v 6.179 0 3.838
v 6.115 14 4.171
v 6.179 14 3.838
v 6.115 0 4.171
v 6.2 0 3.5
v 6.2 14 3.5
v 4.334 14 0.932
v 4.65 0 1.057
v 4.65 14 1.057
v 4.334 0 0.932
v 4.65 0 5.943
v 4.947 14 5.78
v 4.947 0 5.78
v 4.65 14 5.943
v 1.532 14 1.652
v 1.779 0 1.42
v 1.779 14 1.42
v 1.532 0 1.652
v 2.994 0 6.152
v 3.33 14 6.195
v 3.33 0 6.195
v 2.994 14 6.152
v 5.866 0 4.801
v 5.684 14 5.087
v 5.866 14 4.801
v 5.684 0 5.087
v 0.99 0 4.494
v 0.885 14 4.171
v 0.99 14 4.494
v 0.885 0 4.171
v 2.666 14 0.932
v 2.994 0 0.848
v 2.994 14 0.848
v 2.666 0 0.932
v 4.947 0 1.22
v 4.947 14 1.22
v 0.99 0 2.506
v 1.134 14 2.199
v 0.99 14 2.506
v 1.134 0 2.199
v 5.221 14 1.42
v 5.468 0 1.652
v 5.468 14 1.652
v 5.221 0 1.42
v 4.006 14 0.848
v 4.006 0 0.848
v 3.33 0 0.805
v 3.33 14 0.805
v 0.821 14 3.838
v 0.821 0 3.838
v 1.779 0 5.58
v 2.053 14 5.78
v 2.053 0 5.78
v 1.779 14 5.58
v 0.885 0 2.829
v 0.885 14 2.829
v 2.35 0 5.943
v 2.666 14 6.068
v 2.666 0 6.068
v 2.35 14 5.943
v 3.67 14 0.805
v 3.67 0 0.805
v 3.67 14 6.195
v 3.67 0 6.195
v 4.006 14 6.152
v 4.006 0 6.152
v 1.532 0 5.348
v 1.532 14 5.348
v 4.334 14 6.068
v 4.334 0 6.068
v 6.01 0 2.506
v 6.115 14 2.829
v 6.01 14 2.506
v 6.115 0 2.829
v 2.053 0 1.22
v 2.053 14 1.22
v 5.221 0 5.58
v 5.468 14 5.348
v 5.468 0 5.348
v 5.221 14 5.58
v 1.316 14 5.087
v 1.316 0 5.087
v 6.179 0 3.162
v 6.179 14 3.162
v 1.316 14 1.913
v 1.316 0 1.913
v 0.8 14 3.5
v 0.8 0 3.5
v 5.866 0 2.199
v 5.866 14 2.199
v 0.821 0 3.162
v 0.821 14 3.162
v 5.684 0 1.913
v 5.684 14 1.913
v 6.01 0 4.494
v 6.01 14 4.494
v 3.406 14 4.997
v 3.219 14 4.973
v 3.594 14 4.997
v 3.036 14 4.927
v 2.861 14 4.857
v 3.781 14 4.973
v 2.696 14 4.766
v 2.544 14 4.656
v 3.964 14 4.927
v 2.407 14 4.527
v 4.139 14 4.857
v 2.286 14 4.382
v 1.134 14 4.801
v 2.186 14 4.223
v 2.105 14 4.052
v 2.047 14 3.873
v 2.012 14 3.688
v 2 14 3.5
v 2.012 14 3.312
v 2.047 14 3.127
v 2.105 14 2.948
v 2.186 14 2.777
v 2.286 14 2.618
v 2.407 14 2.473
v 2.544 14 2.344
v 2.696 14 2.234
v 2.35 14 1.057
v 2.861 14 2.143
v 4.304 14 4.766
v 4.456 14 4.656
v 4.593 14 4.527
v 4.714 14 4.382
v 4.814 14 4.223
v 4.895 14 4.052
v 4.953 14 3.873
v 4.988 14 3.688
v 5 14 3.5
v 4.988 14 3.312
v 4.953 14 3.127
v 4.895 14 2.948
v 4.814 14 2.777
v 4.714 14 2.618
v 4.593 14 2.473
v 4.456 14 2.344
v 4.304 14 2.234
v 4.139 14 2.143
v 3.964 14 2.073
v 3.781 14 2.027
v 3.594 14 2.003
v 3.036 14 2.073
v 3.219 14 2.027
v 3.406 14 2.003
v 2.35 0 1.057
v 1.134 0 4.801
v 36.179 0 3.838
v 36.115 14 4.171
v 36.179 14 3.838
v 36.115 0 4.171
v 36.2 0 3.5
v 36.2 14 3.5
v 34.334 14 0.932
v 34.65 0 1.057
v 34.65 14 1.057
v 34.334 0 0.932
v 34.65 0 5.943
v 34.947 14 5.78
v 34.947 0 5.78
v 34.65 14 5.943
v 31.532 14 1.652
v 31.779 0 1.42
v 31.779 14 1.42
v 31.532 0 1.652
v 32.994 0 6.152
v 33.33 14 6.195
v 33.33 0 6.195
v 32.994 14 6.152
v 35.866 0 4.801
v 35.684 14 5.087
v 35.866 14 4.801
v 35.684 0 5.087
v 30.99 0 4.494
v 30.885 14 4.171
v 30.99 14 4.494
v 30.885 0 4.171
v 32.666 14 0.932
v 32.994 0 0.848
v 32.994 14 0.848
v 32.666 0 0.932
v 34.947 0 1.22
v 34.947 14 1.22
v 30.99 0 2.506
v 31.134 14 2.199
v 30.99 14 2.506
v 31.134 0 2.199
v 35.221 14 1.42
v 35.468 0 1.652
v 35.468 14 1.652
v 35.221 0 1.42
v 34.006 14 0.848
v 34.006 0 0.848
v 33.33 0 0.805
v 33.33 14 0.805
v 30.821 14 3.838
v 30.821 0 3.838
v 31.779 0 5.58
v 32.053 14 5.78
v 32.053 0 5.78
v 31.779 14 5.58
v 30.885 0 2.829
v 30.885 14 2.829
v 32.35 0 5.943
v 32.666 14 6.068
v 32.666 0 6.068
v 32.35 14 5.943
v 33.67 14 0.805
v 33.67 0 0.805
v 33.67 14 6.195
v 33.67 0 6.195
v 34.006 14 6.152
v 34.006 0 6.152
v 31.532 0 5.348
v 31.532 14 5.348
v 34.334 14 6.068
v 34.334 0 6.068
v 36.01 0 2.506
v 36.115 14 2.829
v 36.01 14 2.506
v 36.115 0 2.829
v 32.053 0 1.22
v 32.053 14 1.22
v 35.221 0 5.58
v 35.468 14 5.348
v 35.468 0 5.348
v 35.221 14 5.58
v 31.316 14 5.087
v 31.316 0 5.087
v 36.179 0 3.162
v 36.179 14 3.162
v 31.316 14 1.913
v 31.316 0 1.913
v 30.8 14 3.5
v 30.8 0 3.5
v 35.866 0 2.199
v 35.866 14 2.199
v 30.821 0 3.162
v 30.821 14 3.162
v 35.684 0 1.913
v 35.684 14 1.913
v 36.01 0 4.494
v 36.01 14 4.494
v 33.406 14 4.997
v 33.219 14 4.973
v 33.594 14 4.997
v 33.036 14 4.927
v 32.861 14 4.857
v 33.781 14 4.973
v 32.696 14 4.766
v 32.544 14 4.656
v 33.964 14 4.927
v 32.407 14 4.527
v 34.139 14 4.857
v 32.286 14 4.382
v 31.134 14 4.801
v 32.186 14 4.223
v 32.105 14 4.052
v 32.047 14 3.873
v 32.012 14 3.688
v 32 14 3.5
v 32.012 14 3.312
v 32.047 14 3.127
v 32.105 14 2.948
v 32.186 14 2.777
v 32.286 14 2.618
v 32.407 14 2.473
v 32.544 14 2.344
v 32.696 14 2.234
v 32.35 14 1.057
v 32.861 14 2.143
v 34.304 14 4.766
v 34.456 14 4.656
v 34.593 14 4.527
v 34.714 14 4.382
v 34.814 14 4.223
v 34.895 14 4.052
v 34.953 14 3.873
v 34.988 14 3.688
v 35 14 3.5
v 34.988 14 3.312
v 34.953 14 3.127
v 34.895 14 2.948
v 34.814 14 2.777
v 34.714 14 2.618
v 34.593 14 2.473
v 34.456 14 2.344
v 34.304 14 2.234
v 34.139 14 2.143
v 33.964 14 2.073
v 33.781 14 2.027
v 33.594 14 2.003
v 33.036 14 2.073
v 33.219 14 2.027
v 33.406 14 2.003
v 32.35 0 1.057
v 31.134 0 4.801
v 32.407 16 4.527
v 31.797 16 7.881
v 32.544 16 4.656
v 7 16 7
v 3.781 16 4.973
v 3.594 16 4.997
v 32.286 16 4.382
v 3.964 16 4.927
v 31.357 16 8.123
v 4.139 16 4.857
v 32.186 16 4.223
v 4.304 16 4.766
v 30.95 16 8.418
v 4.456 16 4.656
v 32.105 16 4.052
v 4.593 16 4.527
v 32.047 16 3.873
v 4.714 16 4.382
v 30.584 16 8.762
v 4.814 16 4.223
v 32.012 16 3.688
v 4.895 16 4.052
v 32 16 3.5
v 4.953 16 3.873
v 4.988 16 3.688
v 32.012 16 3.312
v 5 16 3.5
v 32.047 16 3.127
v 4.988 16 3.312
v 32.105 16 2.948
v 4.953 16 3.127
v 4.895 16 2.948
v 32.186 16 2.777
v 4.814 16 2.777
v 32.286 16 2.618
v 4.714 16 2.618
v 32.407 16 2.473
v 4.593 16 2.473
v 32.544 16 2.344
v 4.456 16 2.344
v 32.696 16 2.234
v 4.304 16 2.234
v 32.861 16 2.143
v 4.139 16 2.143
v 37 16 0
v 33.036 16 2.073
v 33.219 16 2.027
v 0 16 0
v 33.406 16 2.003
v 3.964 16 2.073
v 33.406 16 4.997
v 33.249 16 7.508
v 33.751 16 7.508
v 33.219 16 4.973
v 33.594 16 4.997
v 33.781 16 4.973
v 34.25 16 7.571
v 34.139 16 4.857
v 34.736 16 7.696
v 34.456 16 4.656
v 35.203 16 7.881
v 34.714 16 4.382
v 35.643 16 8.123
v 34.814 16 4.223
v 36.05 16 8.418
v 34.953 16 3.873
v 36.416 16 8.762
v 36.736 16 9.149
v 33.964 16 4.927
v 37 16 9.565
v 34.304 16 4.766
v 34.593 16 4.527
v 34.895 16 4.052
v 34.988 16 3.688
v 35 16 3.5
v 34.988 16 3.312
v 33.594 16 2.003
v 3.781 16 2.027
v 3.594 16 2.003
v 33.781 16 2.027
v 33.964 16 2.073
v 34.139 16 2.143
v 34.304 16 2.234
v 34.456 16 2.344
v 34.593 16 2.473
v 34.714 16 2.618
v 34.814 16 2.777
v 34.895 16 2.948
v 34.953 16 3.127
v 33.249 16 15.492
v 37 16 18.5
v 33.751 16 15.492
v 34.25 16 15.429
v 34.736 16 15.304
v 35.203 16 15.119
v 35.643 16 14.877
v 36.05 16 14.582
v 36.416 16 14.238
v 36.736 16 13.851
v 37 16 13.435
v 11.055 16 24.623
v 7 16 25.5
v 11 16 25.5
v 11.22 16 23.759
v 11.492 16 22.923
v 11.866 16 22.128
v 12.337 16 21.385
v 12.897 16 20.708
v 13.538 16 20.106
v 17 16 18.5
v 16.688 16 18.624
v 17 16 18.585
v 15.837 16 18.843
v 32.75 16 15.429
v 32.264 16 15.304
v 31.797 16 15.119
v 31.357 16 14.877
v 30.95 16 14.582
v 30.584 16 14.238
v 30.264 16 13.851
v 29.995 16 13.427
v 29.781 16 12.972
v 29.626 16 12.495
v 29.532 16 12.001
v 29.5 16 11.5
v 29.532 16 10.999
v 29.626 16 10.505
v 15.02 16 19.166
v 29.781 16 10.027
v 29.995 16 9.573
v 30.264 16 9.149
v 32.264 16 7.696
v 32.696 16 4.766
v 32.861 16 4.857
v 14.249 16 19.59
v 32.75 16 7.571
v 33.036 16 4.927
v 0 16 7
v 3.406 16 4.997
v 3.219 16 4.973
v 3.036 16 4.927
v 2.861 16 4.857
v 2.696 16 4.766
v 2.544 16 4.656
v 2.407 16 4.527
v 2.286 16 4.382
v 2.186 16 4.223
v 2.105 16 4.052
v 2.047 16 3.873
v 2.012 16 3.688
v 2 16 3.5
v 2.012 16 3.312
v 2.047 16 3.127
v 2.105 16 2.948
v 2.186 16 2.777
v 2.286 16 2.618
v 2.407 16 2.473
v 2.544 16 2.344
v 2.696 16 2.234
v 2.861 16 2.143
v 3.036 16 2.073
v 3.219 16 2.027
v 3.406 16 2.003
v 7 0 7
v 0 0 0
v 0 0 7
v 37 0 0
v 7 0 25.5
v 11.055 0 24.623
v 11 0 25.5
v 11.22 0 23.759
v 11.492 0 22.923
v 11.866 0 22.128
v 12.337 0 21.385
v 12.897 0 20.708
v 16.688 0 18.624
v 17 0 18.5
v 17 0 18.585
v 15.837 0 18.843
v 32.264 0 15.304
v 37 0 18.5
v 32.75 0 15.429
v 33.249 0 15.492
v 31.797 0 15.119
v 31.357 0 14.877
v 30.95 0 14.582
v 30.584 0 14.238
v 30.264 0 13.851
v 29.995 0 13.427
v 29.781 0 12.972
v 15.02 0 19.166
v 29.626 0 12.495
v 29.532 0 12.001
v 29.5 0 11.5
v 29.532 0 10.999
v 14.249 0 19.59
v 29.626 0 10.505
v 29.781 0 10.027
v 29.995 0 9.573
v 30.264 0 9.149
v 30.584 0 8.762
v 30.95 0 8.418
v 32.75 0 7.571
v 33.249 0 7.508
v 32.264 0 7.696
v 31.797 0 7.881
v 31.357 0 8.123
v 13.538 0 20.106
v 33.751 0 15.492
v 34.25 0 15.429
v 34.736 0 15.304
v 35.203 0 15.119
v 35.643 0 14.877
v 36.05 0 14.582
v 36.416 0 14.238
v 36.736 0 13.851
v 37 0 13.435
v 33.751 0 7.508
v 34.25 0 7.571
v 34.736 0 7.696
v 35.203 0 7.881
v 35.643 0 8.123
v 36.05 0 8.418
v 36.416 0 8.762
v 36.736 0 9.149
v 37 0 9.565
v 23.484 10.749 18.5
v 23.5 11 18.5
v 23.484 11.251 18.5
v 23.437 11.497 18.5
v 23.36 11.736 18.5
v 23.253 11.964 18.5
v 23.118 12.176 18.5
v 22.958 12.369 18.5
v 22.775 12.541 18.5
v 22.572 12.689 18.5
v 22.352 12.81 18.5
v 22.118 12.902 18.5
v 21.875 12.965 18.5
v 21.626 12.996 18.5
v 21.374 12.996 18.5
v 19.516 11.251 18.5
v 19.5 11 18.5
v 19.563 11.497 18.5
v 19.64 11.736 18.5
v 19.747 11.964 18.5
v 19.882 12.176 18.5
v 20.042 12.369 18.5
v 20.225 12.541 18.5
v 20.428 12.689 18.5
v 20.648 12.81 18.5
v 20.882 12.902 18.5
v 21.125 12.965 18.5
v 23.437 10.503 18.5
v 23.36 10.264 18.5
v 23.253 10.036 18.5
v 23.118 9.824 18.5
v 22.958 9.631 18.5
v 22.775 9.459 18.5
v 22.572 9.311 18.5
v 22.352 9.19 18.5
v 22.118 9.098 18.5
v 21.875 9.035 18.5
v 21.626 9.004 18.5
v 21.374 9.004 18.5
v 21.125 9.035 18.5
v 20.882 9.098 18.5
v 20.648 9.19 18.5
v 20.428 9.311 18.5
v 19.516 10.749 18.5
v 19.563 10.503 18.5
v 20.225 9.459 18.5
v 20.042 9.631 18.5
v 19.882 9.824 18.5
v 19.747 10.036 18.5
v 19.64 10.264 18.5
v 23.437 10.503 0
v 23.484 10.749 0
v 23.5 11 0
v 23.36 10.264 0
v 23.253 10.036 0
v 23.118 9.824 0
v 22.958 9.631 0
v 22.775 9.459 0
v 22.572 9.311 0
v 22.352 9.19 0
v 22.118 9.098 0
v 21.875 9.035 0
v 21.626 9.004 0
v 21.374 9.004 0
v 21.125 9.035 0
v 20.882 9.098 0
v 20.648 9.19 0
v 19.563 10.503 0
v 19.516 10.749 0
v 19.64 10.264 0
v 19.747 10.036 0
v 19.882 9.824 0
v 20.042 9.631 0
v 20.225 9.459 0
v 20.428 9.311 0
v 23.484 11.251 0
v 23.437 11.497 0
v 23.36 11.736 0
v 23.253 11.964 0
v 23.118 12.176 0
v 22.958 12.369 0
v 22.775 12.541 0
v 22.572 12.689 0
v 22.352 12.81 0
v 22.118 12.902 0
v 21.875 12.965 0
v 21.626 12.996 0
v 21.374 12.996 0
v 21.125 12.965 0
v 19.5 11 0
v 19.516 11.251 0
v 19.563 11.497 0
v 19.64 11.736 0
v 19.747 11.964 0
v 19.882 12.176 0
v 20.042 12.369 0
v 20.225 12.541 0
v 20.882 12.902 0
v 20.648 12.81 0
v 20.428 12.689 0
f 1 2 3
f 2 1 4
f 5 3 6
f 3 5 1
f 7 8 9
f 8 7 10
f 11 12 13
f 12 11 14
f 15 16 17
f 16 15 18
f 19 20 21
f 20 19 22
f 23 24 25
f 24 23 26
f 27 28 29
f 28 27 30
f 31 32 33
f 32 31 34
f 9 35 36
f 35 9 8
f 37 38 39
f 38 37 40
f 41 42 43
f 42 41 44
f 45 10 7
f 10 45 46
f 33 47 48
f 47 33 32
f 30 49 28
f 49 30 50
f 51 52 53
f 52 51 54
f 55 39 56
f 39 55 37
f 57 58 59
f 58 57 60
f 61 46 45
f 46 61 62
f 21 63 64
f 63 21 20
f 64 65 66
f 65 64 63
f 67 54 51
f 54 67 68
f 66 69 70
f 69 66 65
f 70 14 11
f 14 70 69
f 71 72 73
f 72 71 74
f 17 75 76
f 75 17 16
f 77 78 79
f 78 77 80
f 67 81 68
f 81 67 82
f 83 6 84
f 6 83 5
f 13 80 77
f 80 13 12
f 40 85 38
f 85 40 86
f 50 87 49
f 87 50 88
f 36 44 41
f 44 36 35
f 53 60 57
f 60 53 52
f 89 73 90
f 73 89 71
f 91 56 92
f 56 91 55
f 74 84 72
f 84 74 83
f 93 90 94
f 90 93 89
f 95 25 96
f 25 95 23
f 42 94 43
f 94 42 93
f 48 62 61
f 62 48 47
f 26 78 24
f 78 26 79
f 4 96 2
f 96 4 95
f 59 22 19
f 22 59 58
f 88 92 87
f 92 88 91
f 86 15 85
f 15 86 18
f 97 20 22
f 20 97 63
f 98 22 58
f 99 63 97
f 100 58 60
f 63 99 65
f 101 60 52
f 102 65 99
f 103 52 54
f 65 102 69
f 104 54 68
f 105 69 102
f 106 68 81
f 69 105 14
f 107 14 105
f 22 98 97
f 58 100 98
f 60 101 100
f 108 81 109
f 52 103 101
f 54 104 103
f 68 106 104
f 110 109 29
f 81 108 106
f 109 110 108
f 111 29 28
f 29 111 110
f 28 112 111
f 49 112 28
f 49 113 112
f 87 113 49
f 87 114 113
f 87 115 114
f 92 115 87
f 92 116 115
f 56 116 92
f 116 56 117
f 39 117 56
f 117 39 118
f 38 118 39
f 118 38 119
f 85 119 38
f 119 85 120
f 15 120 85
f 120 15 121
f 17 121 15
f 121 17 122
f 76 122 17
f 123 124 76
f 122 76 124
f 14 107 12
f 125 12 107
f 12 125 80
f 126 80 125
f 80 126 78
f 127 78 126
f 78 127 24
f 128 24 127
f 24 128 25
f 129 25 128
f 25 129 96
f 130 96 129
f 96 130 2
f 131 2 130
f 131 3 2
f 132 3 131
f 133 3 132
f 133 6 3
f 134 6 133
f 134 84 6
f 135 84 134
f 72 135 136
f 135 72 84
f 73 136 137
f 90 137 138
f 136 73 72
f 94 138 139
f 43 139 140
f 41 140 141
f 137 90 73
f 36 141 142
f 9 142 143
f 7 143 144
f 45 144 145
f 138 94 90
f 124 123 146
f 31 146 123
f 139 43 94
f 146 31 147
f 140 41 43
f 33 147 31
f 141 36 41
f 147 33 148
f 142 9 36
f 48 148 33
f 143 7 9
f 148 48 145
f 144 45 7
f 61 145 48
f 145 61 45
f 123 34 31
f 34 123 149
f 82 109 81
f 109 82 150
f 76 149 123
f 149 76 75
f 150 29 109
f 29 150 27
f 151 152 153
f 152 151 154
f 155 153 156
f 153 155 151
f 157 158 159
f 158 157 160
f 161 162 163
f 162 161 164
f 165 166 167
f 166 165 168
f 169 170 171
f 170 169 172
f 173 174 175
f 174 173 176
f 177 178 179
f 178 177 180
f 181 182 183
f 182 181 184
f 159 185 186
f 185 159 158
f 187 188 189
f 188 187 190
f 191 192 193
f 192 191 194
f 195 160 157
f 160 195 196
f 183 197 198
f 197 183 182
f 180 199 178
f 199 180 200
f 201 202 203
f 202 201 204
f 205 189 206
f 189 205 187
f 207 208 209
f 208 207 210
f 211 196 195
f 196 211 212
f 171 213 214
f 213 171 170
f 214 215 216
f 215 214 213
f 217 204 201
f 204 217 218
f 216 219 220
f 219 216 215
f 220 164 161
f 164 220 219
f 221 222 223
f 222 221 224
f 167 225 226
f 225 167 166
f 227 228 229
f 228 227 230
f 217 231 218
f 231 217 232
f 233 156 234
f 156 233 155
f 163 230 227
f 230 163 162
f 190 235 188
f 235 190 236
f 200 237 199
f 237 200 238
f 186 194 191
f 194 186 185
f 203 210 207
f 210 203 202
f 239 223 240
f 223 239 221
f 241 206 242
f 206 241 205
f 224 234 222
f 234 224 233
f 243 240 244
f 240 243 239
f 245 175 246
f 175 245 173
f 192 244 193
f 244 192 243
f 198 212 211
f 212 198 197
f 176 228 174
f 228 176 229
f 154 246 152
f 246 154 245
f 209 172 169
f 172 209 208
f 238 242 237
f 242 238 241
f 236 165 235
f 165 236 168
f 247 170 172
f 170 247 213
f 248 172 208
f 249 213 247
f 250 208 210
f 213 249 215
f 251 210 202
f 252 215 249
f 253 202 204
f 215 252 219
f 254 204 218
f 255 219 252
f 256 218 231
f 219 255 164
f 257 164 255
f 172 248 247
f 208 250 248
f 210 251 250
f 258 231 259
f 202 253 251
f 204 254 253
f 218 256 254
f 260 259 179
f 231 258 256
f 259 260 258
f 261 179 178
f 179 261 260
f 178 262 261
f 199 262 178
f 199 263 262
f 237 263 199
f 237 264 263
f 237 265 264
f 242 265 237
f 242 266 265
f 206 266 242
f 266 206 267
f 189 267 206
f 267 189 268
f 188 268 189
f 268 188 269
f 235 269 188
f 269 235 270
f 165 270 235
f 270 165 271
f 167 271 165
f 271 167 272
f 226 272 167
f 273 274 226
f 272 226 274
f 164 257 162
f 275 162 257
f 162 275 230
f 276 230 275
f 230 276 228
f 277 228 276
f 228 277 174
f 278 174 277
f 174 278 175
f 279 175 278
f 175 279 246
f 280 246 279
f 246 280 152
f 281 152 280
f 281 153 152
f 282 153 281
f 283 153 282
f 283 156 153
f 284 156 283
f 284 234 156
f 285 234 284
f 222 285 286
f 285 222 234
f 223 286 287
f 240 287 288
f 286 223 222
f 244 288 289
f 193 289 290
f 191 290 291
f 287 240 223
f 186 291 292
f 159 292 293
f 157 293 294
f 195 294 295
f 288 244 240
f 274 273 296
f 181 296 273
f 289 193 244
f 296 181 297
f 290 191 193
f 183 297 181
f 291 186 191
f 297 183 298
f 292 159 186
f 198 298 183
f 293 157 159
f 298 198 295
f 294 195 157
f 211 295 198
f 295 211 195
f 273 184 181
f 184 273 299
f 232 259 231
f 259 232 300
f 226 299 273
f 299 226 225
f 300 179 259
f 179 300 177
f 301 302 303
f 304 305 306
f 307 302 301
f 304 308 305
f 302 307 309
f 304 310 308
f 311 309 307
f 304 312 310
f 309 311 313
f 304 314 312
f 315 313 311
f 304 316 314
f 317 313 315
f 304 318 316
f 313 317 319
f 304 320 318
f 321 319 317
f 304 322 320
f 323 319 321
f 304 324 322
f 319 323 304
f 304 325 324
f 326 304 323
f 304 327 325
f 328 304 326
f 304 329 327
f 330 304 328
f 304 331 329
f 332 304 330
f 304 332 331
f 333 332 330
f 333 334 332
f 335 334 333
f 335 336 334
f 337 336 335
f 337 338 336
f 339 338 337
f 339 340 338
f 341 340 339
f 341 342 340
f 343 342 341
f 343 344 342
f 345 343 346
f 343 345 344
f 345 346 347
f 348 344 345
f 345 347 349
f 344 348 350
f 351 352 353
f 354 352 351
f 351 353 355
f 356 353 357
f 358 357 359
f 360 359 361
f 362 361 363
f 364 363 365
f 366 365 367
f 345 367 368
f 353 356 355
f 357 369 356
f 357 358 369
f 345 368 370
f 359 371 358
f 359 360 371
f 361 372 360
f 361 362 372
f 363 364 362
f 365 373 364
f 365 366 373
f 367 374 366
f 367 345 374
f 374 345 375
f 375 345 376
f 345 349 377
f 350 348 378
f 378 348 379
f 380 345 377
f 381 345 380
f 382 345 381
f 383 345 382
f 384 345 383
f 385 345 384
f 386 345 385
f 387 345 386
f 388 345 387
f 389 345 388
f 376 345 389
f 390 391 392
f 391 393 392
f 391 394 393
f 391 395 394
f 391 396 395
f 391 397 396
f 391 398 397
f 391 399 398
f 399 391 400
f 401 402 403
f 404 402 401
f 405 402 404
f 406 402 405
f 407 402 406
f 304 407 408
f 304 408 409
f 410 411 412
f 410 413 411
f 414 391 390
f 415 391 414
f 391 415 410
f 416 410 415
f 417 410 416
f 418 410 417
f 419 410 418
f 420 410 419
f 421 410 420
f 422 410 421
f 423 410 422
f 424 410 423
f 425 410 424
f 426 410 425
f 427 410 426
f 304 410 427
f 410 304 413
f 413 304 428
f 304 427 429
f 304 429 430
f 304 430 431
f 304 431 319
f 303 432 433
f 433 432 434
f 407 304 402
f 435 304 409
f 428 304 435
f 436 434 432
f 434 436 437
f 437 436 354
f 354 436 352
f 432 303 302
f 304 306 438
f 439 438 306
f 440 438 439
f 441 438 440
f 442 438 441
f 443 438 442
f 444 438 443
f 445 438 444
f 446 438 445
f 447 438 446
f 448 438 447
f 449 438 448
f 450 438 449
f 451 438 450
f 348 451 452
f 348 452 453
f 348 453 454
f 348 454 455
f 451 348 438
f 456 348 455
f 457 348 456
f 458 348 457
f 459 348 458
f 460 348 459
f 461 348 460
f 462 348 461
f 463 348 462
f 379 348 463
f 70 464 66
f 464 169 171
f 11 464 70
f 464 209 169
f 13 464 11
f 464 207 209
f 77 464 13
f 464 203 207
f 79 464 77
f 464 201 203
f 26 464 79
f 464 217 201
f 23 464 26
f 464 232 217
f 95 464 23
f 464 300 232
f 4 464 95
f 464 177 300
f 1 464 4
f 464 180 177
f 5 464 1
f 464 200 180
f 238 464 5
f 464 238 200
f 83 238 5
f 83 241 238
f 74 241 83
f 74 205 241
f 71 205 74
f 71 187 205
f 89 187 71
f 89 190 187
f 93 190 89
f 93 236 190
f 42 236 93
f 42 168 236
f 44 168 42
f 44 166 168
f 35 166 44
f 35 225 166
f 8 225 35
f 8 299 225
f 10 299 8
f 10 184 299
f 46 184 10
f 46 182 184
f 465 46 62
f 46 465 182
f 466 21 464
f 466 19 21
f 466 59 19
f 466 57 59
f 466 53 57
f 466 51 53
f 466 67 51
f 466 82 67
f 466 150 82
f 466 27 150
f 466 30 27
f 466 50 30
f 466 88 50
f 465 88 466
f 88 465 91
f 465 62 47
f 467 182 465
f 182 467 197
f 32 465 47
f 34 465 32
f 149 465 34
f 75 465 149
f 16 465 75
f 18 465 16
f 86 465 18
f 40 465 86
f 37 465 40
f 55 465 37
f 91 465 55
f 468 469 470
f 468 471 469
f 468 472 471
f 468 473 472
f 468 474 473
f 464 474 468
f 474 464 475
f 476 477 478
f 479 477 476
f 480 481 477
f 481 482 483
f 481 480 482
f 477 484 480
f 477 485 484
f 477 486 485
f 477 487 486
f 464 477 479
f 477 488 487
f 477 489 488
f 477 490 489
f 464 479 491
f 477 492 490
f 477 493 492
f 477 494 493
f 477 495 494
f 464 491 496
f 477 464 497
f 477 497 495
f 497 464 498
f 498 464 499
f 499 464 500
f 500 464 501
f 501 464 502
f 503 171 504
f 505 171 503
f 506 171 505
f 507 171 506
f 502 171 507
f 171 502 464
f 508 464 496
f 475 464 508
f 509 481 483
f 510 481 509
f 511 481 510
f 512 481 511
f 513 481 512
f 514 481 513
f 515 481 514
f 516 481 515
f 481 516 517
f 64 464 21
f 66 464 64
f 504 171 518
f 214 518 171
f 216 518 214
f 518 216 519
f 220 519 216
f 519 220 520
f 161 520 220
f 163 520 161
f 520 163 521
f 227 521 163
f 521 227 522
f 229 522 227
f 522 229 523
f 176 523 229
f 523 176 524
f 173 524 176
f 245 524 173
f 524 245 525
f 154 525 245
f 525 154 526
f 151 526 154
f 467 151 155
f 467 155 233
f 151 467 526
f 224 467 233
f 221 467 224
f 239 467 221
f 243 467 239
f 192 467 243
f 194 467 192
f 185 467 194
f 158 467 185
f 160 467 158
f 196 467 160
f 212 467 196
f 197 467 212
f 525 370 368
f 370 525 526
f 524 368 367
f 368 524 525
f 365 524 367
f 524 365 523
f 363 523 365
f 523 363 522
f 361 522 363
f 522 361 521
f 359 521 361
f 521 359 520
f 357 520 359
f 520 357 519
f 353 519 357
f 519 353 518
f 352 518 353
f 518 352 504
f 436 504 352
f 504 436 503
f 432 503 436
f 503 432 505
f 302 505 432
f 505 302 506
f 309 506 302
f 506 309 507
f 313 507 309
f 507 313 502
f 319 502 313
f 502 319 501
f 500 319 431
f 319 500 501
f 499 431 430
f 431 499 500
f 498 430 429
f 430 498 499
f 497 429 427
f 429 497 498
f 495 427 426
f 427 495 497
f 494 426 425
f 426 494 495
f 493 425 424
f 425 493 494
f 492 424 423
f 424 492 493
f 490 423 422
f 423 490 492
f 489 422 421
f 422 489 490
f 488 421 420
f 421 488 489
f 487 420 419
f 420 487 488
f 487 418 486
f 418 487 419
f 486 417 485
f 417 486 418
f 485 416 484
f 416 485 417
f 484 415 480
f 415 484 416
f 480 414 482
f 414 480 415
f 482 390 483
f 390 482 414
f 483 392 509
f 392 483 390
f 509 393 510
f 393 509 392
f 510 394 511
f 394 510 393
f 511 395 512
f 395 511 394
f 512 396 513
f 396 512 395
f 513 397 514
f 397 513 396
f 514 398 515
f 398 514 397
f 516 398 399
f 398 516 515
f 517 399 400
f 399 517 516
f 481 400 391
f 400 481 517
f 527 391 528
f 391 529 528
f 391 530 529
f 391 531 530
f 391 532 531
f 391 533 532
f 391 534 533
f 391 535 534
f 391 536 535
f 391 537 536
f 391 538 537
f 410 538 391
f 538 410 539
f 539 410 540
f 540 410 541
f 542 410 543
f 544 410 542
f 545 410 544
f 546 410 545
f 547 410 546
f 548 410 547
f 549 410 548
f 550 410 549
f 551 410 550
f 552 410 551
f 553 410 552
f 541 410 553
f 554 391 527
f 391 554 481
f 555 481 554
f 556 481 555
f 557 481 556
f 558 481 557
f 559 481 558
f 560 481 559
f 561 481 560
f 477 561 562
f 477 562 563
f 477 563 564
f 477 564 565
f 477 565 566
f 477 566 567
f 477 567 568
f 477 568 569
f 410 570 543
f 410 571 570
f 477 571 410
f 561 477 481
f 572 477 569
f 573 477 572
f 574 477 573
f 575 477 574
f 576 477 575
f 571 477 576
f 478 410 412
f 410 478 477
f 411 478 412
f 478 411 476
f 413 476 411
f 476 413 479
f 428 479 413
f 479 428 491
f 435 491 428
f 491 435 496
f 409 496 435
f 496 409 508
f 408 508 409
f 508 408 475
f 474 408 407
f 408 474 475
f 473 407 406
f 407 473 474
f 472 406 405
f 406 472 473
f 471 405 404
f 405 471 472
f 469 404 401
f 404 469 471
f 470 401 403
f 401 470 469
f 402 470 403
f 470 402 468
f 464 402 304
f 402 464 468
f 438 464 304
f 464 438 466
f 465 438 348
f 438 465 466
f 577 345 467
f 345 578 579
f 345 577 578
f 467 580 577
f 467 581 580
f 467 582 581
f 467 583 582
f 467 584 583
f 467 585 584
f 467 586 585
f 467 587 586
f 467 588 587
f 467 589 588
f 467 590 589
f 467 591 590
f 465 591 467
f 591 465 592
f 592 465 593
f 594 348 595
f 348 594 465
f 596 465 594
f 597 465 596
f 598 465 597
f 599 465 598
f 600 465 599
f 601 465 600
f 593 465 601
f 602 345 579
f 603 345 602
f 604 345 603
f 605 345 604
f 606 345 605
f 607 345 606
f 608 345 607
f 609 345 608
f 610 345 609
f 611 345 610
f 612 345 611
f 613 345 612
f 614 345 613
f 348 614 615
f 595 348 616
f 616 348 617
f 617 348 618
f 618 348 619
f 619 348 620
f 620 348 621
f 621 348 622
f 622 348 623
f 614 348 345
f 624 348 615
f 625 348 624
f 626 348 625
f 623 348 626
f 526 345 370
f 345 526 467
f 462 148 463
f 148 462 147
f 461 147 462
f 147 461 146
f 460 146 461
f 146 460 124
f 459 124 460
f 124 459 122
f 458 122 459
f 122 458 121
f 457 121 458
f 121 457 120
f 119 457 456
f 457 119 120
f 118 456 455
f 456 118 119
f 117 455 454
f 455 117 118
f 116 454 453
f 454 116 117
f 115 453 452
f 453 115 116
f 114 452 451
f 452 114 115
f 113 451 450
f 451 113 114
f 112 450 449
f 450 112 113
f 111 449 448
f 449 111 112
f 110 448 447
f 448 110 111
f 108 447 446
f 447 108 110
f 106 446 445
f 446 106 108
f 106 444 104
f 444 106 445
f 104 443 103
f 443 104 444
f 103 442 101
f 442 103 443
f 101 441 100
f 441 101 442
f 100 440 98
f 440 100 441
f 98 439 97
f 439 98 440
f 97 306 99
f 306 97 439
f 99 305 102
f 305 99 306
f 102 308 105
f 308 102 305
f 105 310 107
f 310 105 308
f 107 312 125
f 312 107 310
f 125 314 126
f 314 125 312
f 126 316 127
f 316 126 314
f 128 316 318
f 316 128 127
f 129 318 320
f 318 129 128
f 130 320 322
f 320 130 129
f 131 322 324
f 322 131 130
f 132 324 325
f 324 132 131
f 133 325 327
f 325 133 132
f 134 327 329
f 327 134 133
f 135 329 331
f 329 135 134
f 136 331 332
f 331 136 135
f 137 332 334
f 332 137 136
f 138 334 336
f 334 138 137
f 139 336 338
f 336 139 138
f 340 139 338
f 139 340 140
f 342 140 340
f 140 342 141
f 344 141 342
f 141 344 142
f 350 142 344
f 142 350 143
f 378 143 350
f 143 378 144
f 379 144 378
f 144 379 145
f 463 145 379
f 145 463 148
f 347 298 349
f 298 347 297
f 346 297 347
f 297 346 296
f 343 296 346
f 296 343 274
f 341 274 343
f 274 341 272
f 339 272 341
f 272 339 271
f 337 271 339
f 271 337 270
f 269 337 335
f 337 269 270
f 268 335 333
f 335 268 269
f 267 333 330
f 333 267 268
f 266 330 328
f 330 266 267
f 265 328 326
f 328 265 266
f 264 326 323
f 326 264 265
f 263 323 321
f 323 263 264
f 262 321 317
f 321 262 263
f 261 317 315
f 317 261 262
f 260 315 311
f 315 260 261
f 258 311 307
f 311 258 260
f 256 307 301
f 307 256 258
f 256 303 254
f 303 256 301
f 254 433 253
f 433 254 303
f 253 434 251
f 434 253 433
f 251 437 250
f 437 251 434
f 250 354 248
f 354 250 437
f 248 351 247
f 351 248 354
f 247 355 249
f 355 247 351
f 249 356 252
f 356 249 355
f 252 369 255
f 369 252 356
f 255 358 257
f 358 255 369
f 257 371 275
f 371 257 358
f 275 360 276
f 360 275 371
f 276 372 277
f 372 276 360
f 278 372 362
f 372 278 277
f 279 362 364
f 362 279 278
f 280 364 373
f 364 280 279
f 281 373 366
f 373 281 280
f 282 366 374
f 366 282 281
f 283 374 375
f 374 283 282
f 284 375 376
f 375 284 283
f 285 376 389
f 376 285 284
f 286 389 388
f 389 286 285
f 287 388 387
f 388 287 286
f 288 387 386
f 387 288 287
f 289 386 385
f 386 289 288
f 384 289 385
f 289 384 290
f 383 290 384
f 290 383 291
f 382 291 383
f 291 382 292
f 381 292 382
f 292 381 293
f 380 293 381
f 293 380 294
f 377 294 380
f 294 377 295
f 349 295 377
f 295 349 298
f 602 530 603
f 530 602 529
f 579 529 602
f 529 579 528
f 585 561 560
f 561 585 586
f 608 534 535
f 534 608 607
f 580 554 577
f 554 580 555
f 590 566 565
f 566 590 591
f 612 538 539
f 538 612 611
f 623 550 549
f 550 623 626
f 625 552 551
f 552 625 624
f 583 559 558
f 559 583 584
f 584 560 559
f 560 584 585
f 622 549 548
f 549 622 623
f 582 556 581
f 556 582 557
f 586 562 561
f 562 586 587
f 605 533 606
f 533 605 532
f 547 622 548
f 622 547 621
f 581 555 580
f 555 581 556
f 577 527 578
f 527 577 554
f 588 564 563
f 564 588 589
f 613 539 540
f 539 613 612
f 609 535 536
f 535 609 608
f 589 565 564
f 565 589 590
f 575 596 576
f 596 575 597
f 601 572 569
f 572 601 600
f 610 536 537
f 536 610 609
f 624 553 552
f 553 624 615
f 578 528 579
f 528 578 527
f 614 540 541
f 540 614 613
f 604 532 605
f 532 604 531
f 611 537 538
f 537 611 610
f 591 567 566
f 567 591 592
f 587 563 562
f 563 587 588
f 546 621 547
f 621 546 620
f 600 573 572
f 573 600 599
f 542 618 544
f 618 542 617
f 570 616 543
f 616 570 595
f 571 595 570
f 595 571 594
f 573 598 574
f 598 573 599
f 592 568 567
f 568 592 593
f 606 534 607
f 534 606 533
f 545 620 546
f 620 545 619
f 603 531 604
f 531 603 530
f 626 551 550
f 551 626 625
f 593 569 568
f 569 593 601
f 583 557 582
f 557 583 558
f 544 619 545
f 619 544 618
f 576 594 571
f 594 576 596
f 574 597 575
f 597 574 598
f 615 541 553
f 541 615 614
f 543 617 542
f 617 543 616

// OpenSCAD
$fn=50;
module base_flat() {
    difference() {
        square([37,19.5]);
        translate([11.5,11])circle(r=3);
    }
}

module side_flat() {
    difference() {
        square([37,34]);
        for(i=[3.5,37-3.5])translate([i,3.5])circle(r=3/2);
        translate([37-3.5,11.5])circle(r=8/2);
        translate([0,7])square([7,50]);
        translate([18,25.5])circle(r=7);
        translate([5,25.5])square([37,34]);
        translate([17,18.5])square([37,34]);
    }
}
module side_ext() {
    difference() {
        translate([0,16])rotate(a=[90,0,0])difference() {
            linear_extrude(height=16)side_flat();
            for(i=[3.5,37-3.5])translate([i,3.5,2])cylinder(r=5.4/2,h=16);
        }
        translate([21.5,11])cylinder(r=2,h=30);
    }
}
module base_ext() {
    linear_extrude(height=16)base_flat();
}
side_ext();
